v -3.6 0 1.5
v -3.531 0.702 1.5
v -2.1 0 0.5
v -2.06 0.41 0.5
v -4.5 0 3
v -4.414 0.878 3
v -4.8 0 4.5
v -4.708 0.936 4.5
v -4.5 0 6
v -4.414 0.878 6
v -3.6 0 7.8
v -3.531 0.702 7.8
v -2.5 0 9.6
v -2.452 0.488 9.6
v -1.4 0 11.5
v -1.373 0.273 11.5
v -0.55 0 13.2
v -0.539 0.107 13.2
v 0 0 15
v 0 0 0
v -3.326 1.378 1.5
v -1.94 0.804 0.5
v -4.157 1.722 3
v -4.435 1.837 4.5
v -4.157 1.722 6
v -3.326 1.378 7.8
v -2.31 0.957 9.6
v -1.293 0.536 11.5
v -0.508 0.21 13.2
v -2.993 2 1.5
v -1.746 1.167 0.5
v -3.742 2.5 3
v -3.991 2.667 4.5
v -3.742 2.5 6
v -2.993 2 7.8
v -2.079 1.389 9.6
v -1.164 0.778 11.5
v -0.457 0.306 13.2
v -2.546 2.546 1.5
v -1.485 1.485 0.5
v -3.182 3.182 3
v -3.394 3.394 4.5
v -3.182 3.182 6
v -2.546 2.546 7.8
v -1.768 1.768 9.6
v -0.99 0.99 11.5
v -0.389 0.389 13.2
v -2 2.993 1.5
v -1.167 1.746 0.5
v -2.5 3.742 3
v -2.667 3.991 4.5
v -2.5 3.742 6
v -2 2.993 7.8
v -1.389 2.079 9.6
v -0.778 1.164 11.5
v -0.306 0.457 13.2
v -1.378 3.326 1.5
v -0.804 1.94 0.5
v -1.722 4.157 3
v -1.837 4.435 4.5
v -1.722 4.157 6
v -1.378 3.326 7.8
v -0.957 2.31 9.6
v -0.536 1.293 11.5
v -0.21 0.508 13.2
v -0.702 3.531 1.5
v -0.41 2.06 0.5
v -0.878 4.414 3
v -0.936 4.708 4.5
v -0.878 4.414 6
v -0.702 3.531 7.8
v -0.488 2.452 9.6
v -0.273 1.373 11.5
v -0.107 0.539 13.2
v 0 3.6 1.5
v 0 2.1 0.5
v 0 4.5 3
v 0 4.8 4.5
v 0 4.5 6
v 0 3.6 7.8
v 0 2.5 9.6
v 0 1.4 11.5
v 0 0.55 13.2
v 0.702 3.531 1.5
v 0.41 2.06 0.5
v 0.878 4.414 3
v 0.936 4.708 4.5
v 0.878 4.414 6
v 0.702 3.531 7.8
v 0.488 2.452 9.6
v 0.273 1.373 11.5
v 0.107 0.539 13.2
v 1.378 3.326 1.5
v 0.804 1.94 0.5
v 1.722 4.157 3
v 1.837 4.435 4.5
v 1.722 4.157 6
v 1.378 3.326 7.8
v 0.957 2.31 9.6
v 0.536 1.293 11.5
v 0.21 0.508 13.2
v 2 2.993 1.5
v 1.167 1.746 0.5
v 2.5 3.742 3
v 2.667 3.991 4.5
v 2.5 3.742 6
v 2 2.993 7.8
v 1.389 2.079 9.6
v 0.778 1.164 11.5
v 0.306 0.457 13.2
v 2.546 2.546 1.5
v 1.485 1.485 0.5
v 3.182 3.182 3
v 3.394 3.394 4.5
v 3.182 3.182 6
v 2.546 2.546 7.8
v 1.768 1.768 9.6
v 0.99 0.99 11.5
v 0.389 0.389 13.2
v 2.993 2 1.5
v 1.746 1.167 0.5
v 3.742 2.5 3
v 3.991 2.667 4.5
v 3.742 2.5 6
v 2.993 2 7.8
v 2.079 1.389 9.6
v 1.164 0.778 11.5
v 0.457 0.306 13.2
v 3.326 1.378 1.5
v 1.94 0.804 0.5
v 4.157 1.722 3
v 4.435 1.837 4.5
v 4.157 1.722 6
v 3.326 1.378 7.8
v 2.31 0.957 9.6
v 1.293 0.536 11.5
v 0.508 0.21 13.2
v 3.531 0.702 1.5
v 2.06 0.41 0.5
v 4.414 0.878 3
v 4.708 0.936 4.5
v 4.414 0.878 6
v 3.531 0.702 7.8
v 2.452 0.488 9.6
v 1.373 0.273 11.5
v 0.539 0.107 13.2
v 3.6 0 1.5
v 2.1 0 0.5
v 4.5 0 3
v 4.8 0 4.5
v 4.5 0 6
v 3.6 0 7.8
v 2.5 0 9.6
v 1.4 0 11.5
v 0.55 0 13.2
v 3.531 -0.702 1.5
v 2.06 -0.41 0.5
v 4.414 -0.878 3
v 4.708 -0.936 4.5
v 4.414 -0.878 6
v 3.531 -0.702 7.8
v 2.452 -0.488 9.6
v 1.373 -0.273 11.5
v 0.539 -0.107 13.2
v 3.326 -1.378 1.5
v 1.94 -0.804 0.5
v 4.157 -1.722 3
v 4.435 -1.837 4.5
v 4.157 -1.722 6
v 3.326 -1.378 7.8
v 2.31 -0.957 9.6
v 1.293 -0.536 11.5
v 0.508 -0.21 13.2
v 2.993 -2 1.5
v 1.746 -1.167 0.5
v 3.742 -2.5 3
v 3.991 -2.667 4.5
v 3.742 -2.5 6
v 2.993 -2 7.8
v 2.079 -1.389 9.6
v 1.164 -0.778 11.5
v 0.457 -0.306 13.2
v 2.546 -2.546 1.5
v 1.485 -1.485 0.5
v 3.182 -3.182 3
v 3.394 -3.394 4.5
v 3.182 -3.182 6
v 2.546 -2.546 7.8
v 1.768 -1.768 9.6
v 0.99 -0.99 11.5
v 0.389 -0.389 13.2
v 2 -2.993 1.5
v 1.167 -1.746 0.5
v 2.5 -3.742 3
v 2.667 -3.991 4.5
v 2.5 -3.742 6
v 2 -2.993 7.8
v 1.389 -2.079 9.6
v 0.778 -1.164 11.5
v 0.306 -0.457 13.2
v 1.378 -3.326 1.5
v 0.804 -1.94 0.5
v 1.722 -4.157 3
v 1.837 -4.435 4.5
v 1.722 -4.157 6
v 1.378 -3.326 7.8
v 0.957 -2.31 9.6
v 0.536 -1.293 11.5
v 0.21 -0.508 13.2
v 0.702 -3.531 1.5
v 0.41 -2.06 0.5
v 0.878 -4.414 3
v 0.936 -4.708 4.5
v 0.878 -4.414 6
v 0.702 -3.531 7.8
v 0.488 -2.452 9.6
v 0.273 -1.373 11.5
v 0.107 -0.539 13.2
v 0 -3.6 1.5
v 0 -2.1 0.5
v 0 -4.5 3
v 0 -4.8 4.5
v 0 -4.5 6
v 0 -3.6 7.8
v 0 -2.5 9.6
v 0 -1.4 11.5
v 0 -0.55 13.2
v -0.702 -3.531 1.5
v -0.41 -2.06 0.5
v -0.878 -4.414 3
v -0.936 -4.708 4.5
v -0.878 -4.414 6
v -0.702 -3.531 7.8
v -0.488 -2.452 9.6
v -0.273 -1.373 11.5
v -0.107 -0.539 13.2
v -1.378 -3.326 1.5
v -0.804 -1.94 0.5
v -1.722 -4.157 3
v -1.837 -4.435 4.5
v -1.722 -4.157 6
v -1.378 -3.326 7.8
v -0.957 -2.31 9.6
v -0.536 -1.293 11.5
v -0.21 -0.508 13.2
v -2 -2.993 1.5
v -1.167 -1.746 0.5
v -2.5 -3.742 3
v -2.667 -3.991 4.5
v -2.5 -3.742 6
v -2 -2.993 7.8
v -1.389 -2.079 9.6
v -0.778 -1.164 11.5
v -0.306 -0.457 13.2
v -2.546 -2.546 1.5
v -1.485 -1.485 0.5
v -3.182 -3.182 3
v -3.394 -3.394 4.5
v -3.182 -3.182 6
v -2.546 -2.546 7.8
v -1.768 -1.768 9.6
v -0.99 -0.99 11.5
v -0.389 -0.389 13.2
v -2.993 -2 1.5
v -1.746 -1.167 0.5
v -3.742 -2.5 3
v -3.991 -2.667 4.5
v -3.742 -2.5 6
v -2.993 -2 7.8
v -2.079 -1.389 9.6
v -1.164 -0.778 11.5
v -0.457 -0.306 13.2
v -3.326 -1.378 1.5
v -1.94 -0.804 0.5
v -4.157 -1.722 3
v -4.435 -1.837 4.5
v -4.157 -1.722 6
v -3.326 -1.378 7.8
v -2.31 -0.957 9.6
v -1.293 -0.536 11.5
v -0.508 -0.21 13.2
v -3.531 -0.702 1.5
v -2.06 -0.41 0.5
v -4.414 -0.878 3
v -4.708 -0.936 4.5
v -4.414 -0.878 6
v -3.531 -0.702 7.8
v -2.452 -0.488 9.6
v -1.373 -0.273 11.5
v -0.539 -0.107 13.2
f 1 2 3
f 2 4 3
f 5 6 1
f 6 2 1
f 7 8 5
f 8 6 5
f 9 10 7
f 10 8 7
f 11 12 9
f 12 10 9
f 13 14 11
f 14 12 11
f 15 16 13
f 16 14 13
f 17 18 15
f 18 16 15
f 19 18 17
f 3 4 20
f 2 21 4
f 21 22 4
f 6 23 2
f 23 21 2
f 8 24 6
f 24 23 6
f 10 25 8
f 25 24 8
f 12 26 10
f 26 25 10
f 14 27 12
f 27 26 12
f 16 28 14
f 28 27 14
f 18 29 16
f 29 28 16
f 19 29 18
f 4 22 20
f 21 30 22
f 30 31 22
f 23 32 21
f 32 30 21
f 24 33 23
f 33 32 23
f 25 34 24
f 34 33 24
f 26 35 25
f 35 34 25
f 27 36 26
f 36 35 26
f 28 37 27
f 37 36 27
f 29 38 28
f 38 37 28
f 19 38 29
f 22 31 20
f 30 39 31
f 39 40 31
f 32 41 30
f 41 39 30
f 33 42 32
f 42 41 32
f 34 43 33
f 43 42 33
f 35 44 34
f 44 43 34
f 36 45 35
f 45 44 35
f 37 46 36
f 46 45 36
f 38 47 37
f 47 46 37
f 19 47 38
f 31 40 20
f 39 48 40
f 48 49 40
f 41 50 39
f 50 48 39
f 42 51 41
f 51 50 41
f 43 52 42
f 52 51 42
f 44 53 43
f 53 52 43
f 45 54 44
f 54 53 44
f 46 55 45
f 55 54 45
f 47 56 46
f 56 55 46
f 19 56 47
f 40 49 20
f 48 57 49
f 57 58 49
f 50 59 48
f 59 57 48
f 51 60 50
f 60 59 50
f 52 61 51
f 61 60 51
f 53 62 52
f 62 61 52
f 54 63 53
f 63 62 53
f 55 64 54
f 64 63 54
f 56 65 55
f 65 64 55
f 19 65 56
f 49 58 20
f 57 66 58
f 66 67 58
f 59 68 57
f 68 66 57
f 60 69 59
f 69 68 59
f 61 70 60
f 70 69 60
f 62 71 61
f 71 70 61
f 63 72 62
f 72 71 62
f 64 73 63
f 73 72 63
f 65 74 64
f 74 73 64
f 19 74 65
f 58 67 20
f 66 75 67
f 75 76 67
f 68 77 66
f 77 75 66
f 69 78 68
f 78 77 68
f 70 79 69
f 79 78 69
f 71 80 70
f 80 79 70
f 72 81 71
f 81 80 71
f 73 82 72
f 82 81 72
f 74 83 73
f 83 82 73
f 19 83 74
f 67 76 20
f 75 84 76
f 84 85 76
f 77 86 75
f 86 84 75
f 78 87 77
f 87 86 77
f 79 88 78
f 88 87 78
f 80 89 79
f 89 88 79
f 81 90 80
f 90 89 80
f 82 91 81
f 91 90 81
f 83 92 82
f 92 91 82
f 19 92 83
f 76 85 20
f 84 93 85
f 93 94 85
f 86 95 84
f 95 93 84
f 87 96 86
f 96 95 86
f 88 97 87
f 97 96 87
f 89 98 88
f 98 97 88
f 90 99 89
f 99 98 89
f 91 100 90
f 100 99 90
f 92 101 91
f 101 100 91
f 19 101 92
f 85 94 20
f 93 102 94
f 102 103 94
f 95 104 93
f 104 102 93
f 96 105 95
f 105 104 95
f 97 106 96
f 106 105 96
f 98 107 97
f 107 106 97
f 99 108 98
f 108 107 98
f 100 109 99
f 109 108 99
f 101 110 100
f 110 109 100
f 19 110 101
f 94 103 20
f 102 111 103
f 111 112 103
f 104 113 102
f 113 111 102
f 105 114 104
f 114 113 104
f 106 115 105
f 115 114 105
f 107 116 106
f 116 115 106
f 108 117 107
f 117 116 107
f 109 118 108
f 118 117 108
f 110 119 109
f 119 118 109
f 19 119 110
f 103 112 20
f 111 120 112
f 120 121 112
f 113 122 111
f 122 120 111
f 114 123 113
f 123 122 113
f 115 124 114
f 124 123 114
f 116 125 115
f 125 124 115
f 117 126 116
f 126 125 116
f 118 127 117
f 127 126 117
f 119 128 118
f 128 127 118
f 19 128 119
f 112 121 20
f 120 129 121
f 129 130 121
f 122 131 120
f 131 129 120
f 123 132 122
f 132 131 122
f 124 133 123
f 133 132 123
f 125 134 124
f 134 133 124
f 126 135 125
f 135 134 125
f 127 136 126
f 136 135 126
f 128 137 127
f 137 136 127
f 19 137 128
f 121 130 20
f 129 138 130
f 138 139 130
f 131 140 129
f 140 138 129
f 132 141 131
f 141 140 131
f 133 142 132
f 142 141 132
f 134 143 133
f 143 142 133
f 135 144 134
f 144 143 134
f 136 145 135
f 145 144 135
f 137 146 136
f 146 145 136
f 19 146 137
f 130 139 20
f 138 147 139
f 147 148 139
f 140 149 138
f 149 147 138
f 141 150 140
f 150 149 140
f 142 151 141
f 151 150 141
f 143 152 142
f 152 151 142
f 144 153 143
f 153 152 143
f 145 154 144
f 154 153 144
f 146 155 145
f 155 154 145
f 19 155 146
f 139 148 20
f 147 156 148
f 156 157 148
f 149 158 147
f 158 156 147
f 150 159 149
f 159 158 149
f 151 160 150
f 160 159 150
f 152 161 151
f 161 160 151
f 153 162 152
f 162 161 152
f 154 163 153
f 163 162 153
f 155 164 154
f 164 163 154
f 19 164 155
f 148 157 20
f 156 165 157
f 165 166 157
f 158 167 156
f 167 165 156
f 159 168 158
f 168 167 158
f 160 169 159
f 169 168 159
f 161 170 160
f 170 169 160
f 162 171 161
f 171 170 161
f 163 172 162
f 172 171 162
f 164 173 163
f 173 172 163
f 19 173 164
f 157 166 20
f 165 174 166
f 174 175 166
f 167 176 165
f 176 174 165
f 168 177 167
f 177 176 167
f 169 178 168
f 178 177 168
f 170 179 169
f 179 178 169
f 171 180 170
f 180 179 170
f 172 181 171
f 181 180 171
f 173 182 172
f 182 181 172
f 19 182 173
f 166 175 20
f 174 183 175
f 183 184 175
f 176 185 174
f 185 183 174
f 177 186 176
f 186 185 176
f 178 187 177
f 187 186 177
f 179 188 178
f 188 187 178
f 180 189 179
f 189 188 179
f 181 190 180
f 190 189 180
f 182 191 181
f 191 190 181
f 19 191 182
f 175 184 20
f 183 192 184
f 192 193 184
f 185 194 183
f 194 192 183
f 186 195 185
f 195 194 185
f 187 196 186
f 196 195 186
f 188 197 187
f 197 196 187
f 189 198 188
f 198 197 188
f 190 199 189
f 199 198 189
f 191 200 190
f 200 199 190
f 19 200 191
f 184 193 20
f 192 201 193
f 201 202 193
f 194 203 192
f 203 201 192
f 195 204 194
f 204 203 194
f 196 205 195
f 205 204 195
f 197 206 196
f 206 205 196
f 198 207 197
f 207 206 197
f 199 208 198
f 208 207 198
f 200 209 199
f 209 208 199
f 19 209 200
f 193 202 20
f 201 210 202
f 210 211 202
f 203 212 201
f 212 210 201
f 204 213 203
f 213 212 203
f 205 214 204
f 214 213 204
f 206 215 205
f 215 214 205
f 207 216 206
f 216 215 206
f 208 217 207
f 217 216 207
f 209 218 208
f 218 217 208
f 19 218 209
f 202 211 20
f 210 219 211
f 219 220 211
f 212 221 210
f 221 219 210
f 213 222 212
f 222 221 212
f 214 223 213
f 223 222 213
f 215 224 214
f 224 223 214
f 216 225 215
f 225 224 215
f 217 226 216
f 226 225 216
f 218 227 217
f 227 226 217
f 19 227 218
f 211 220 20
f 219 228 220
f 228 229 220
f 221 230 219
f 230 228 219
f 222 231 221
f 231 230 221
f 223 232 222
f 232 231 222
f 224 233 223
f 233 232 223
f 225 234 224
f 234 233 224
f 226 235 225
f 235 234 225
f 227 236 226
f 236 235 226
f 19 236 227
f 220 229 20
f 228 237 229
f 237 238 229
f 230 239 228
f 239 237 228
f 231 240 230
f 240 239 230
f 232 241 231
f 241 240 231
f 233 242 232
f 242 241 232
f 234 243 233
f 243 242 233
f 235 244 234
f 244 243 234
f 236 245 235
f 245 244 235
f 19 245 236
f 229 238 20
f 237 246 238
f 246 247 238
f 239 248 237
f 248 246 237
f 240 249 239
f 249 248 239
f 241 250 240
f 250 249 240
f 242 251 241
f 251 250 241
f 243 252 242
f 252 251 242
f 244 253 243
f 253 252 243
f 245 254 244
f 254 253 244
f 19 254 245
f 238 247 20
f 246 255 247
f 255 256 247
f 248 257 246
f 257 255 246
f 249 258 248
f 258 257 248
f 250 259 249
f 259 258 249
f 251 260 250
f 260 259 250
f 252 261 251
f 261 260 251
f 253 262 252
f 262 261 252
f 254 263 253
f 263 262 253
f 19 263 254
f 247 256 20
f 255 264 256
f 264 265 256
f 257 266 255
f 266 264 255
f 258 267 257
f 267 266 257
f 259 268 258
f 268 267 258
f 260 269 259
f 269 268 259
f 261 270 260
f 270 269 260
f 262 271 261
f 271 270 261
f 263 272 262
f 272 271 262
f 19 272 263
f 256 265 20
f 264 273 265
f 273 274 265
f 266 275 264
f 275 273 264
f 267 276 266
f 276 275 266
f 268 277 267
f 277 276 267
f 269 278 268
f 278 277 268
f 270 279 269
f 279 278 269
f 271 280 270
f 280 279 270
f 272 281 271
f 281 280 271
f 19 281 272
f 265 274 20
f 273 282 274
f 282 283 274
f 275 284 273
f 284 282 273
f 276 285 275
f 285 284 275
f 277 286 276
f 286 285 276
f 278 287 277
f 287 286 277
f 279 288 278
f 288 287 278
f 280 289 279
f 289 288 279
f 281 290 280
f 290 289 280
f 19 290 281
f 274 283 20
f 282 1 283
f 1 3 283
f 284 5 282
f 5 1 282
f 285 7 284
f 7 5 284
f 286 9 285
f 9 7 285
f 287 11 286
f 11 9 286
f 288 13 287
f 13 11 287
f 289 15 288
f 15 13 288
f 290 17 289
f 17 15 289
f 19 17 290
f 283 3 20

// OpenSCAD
// A closed 3D teardrop. Display geometry only: this marks a CFD sample point.
// Broad rounded body, tapered tip; 32 sides keep the CPU lesson inexpensive.
$fn = 32;
rotate_extrude(convexity=4)
    polygon([[0, 0], [2.1, .5], [3.6, 1.5], [4.5, 3], [4.8, 4.5],
             [4.5, 6], [3.6, 7.8], [2.5, 9.6], [1.4, 11.5],
             [.55, 13.2], [0, 15]]);
